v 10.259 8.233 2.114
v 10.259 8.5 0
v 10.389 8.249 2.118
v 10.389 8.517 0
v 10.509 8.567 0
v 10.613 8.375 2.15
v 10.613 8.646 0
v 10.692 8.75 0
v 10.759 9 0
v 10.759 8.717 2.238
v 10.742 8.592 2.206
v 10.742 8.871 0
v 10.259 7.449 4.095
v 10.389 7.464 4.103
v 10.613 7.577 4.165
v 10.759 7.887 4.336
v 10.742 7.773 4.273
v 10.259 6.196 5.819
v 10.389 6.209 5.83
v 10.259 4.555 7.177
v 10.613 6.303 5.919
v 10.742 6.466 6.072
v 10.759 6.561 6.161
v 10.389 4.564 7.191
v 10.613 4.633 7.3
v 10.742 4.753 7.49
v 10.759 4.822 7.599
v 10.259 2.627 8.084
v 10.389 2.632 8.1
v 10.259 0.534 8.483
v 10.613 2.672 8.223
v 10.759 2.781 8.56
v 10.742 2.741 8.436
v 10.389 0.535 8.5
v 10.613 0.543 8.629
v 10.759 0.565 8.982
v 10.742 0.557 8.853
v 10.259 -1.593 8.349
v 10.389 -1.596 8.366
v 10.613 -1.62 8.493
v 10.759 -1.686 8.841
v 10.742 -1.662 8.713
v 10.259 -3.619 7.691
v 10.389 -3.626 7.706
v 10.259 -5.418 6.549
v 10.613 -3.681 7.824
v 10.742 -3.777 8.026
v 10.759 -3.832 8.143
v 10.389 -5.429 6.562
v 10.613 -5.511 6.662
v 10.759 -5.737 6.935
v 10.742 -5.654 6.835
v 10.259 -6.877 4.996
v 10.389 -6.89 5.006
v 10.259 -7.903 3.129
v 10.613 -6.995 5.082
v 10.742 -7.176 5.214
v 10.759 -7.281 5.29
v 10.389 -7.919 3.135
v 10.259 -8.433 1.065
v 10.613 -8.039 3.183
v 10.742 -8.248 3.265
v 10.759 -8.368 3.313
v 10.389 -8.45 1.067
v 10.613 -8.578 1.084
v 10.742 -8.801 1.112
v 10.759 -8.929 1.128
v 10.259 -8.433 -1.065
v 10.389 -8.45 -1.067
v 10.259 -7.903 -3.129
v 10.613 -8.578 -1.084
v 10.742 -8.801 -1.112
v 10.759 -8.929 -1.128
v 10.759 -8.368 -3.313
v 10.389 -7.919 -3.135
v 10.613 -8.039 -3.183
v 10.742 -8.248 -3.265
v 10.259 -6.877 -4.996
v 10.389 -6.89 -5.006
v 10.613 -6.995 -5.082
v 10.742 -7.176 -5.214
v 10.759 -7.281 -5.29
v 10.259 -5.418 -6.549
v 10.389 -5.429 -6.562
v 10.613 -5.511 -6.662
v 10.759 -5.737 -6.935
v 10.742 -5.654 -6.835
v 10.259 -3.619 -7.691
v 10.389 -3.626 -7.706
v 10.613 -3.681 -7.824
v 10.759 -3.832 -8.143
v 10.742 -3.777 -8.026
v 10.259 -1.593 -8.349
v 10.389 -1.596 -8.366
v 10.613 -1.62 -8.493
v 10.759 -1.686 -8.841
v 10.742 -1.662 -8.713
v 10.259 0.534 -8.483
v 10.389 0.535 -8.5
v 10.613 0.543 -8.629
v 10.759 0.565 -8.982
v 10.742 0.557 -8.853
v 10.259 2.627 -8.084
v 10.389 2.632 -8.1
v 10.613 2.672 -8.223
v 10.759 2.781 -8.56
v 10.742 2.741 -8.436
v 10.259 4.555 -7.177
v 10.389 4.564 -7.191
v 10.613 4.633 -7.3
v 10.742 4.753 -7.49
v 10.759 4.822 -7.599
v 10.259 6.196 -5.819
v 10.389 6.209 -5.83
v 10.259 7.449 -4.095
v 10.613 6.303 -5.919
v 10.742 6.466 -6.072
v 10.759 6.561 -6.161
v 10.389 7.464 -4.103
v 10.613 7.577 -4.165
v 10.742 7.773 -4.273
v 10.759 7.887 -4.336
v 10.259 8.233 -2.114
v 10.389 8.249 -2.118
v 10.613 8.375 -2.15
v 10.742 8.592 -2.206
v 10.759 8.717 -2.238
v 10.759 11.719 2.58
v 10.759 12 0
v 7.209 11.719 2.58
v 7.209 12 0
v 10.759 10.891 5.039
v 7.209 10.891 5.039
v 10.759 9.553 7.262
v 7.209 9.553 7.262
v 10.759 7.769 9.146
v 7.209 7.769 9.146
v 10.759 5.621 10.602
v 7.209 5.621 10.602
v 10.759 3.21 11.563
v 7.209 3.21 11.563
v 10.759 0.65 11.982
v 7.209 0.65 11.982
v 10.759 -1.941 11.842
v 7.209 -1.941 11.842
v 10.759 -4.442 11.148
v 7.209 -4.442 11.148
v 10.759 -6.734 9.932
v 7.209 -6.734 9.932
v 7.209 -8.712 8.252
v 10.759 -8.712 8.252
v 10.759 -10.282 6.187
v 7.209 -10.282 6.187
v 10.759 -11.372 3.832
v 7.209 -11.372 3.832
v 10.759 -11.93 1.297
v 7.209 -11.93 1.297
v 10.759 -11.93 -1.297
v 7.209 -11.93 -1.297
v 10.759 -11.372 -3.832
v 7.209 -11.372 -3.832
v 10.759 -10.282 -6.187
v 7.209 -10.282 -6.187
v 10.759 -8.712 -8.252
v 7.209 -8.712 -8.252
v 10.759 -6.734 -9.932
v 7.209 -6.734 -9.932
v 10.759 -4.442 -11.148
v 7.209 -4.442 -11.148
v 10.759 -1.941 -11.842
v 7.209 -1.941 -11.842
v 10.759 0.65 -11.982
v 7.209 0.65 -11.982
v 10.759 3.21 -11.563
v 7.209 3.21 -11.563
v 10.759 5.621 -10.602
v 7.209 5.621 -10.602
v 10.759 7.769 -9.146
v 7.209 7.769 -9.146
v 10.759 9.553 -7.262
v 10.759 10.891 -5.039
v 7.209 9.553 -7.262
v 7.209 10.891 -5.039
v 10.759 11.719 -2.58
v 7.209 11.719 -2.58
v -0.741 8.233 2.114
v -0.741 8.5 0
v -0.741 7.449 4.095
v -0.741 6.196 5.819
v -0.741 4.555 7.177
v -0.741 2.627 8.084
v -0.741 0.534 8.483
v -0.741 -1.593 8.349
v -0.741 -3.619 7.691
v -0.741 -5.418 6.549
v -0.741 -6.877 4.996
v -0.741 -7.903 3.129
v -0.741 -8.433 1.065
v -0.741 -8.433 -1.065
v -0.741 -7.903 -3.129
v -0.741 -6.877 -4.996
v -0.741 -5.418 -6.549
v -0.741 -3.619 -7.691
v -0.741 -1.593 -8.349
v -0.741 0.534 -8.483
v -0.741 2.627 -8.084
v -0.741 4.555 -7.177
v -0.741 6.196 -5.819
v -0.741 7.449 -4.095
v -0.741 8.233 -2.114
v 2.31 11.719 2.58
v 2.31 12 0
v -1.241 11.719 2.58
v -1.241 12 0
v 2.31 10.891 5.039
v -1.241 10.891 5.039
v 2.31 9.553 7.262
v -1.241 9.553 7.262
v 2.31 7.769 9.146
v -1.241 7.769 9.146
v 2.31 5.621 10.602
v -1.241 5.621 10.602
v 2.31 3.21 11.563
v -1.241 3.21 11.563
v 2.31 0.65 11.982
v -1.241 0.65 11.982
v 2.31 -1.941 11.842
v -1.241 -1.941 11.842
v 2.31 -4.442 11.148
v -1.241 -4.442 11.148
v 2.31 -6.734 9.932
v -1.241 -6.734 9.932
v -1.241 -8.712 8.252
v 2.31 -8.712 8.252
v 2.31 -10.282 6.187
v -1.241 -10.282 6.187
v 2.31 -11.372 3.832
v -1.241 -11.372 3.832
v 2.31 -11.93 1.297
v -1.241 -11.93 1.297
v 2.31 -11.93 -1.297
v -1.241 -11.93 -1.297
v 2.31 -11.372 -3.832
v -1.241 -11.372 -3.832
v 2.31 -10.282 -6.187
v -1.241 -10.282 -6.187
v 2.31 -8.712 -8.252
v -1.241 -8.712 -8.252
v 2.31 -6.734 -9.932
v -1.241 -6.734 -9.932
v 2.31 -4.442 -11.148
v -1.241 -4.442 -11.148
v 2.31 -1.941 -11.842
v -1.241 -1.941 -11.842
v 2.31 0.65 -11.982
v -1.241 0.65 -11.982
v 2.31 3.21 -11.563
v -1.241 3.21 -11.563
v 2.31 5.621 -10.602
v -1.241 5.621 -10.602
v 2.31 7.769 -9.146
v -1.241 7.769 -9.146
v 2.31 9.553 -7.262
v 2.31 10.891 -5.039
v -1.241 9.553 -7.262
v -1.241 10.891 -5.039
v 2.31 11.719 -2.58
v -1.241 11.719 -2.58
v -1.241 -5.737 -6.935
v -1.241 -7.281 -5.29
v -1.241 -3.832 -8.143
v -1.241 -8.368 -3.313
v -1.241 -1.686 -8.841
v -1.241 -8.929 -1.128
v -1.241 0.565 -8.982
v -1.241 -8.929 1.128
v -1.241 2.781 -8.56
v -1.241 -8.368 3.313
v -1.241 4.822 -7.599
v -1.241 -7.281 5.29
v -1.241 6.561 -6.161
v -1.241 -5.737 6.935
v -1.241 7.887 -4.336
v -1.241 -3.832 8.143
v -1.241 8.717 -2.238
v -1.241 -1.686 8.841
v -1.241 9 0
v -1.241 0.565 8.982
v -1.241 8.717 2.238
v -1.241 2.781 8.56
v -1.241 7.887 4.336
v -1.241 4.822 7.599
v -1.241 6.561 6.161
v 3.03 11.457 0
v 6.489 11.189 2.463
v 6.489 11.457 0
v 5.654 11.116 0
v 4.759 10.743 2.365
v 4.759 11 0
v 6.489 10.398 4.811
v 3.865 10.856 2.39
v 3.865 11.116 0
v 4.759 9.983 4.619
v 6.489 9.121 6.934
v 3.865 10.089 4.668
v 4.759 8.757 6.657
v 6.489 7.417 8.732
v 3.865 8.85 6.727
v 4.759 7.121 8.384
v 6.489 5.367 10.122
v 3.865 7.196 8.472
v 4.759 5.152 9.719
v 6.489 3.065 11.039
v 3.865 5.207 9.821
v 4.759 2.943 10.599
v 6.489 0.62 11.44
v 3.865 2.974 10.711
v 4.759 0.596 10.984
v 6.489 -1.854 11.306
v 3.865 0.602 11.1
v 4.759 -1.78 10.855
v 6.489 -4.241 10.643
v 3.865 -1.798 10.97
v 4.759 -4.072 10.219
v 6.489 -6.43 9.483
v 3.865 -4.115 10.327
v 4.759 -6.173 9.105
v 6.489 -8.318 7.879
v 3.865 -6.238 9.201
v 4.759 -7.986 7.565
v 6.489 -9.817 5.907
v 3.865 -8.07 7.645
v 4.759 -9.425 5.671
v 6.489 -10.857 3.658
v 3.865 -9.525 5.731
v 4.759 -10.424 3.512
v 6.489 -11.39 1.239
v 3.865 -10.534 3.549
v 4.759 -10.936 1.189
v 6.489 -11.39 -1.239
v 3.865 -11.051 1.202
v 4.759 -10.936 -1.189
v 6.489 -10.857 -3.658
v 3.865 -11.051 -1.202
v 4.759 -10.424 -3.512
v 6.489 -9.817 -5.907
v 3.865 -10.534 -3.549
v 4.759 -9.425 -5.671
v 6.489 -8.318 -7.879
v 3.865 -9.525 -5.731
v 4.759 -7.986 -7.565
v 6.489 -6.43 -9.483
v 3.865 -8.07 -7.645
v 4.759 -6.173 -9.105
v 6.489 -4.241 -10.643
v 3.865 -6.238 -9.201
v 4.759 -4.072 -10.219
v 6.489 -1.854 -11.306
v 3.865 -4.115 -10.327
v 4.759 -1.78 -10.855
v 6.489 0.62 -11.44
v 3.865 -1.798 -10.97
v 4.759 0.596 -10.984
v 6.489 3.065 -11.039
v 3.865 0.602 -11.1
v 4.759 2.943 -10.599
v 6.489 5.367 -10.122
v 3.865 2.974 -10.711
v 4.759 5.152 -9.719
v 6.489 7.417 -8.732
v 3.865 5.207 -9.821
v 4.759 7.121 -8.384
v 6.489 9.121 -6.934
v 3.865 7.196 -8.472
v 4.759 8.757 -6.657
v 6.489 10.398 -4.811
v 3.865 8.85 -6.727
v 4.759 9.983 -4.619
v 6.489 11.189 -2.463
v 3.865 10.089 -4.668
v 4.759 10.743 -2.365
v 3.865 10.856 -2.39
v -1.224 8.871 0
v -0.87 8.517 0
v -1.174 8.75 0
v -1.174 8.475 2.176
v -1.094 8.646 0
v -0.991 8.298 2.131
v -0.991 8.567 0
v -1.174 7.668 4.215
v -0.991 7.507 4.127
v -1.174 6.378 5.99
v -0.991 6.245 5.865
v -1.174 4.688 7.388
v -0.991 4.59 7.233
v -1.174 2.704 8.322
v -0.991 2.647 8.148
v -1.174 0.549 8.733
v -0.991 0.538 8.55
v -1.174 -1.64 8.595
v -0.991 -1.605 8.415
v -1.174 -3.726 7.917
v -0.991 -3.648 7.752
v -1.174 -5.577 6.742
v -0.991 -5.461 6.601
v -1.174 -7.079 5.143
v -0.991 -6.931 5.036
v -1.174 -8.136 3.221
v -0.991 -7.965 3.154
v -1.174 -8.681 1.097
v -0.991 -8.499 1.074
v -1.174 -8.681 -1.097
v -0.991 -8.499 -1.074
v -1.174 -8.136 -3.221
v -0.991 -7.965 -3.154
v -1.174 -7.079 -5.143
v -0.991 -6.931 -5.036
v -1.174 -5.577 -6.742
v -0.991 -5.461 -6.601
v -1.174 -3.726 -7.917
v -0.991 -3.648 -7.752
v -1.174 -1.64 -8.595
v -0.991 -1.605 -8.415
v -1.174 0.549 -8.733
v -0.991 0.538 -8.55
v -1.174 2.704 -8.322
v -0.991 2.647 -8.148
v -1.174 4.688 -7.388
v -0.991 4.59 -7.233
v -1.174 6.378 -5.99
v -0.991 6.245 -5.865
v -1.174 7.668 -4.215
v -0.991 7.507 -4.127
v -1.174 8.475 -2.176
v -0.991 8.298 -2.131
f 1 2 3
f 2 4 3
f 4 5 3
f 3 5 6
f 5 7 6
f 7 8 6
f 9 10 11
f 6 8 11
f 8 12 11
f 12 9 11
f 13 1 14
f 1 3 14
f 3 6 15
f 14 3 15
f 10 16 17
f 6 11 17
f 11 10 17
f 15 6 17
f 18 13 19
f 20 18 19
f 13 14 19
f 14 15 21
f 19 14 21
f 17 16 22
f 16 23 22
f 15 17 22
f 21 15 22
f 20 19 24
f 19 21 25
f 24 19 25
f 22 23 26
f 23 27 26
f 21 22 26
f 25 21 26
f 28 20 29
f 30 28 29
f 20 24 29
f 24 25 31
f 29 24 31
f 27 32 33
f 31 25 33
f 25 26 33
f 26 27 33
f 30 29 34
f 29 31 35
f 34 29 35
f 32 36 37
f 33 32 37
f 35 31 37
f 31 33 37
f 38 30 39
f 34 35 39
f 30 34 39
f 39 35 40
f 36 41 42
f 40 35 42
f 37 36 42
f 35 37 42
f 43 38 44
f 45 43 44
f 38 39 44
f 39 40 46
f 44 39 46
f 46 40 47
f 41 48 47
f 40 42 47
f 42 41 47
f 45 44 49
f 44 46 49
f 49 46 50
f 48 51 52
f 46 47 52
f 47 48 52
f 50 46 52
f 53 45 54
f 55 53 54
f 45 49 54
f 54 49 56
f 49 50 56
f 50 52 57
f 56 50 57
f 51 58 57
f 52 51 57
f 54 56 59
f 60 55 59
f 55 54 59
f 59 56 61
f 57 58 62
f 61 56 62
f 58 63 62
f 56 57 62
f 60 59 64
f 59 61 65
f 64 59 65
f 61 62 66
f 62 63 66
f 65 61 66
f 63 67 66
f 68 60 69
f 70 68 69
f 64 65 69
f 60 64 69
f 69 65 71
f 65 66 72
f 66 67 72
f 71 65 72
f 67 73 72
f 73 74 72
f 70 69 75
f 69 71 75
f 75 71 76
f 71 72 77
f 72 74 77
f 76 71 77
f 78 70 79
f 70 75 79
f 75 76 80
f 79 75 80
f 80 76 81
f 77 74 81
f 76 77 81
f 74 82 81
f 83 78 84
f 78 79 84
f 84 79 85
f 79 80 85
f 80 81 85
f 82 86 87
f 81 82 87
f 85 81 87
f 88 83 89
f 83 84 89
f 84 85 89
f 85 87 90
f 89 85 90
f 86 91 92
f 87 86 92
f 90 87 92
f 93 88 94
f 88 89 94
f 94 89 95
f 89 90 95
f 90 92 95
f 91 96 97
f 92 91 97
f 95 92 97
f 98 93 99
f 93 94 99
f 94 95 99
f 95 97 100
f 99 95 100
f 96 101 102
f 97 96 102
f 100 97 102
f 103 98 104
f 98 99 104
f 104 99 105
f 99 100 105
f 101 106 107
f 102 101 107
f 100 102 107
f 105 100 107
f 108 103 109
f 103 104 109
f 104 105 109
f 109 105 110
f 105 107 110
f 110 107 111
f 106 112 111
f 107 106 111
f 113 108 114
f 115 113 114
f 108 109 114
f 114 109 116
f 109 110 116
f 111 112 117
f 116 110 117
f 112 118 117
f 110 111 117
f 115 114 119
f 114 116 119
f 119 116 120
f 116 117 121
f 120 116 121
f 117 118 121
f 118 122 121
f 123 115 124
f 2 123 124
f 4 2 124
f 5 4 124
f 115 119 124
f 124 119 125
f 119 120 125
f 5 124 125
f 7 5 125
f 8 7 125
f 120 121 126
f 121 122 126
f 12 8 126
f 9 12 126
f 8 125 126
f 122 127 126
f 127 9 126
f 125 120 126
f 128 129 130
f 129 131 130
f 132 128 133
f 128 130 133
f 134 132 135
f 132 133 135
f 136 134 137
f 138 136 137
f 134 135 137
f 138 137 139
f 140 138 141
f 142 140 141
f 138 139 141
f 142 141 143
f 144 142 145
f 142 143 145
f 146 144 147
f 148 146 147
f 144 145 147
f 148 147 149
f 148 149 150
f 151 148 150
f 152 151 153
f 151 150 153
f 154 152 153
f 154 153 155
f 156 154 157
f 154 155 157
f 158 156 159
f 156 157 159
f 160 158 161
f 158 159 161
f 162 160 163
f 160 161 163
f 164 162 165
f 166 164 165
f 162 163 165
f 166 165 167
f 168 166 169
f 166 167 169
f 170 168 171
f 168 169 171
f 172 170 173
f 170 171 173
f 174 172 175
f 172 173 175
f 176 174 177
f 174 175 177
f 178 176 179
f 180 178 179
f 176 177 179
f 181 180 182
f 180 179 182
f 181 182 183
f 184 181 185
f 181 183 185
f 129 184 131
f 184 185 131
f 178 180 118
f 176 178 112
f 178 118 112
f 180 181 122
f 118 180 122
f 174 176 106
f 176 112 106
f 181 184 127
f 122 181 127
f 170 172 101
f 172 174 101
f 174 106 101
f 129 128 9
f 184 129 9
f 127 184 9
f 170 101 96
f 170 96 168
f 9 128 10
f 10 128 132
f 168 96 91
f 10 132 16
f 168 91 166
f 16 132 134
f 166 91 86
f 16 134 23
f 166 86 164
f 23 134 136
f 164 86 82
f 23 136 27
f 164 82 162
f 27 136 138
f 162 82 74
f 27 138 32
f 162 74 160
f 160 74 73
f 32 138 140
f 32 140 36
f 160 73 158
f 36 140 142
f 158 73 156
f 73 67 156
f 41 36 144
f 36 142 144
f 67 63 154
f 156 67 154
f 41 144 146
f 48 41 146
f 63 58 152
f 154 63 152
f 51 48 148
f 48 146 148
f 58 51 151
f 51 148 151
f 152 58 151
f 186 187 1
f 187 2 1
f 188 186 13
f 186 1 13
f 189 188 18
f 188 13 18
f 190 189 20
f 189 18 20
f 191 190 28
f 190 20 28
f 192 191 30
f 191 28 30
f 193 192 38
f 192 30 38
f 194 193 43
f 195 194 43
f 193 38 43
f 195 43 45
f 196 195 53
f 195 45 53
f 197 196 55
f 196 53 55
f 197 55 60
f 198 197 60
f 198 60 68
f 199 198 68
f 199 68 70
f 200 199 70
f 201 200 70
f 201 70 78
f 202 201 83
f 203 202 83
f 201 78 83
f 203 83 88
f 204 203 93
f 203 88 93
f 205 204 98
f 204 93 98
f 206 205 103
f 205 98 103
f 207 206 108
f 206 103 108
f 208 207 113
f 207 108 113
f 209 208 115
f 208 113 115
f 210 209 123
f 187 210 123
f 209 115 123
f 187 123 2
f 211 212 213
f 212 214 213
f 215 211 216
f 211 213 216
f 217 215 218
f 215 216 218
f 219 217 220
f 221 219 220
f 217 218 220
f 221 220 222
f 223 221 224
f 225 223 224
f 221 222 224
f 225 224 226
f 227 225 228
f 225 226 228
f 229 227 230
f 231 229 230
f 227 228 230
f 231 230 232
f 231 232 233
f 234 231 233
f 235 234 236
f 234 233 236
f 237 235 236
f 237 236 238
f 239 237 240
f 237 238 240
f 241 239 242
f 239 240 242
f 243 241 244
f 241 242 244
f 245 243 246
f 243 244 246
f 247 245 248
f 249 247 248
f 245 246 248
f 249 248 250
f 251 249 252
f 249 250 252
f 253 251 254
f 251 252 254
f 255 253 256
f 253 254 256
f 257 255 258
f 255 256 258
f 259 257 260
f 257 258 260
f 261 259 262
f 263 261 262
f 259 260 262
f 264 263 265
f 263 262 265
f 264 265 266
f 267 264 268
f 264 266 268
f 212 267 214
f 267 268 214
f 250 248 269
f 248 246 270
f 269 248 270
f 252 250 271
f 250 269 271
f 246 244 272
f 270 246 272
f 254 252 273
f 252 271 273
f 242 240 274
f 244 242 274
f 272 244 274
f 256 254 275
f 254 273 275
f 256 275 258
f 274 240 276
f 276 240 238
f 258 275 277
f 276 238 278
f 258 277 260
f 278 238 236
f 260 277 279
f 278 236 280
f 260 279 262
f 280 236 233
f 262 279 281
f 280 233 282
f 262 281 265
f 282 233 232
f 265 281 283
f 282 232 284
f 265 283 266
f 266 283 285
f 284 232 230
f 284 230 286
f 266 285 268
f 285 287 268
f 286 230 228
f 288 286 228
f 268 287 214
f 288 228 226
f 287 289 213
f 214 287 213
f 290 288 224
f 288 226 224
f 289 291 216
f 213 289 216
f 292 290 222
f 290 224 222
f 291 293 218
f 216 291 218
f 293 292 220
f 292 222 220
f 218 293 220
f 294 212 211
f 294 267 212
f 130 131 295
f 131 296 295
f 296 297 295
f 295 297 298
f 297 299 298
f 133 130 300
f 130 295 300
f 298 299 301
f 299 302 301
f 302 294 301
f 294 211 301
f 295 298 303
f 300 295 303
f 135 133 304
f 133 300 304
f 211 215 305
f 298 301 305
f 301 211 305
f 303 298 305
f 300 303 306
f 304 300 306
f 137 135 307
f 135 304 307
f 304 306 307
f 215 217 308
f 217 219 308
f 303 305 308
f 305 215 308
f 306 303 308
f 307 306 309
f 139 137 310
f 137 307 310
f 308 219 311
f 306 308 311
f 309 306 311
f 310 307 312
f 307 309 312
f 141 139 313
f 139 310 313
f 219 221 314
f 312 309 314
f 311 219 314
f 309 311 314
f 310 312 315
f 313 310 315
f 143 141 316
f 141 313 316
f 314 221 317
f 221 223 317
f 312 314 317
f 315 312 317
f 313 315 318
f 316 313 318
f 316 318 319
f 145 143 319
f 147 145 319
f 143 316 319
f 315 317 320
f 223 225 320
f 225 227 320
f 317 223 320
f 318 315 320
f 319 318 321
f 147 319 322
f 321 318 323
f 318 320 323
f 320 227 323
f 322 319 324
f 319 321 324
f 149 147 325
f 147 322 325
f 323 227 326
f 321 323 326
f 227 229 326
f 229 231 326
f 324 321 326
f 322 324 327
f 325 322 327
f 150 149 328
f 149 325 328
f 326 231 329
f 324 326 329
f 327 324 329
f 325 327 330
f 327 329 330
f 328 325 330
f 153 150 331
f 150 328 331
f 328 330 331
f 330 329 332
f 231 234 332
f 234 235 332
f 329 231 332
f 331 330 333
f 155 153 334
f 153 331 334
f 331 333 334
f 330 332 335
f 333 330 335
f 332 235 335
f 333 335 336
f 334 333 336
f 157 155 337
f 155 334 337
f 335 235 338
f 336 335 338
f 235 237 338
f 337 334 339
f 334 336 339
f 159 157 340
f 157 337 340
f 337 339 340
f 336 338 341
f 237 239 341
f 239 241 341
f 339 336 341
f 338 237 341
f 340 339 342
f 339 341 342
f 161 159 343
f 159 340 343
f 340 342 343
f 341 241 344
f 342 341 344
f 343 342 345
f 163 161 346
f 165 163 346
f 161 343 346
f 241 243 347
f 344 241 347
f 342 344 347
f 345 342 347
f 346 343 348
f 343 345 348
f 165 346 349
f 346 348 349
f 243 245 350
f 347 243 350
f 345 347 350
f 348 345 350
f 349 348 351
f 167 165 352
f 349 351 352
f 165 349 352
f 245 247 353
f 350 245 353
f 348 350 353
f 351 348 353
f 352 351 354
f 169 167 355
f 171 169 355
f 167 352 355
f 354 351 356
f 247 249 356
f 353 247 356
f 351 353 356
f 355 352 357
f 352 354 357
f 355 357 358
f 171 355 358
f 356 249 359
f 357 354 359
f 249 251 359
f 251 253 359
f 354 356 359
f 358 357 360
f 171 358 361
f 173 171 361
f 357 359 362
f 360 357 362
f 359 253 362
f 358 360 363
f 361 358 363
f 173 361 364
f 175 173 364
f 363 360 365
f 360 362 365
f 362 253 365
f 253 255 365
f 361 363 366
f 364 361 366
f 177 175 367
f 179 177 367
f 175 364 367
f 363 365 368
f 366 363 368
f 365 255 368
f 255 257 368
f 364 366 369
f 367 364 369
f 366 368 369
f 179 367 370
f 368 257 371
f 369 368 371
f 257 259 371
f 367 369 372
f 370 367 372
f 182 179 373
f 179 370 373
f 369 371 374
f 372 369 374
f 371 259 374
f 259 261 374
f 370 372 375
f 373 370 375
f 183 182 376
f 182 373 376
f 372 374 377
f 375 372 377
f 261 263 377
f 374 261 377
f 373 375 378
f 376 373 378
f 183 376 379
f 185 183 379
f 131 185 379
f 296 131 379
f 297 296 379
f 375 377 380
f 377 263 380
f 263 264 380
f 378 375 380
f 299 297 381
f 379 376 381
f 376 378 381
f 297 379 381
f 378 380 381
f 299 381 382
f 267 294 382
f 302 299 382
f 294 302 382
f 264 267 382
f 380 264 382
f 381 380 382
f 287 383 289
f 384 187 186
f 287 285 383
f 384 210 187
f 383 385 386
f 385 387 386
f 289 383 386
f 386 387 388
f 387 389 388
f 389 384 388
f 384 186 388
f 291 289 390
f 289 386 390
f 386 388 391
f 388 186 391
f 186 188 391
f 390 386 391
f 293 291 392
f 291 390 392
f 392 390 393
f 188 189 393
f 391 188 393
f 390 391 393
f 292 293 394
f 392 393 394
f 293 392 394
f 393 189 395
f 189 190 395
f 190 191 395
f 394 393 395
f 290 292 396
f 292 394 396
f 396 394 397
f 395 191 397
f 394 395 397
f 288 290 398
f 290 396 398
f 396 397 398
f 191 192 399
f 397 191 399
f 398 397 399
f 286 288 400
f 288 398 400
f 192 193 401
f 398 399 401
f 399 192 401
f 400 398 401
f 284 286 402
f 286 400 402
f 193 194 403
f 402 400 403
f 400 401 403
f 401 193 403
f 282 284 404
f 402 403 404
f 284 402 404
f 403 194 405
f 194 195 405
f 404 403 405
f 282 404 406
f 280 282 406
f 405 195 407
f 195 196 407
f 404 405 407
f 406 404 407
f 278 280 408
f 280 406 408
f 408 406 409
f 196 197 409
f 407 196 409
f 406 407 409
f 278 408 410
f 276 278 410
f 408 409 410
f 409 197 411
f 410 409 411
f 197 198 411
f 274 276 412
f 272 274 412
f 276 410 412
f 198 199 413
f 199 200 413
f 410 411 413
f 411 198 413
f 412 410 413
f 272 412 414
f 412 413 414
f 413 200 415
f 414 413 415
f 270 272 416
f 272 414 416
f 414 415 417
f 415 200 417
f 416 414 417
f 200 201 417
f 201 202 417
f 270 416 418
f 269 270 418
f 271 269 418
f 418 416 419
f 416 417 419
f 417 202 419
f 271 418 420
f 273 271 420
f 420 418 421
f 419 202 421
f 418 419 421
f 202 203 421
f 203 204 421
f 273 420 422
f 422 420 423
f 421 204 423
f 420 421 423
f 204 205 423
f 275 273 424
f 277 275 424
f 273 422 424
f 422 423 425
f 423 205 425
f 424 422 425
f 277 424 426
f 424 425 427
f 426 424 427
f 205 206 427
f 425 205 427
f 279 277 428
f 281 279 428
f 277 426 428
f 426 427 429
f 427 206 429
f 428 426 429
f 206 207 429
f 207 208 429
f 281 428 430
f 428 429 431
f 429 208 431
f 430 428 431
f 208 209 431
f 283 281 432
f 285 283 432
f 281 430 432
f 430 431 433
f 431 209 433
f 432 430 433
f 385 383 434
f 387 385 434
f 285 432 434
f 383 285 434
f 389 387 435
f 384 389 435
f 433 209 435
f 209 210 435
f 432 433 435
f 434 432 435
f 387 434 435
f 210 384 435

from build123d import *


with BuildPart() as part:
    # Sketch1 → Revolve1 (revolve)
    with BuildSketch(Plane.XY):
        with BuildLine():
            Line((-0.740666673, 8.5), (10.259333327, 8.5))
            ThreePointArc((10.259333327, 8.5), (10.612886718, 8.646446609), (10.759333327, 9))
            Line((10.759333327, 9), (10.759333327, 12))
            Line((10.759333327, 12), (7.20882307, 12))
            ThreePointArc((7.20882307, 12), (4.759333327, 11), (2.309843584, 12))
            Line((2.309843584, 12), (-1.240666673, 12))
            Line((-1.240666673, 12), (-1.240666673, 9))
            ThreePointArc((-1.240666673, 9), (-1.094220063, 8.646446609), (-0.740666673, 8.5))
        make_face()
    revolve(axis=Axis((-52.659695599, 0, 0), (1, 0, 0)))


solid = part.part
